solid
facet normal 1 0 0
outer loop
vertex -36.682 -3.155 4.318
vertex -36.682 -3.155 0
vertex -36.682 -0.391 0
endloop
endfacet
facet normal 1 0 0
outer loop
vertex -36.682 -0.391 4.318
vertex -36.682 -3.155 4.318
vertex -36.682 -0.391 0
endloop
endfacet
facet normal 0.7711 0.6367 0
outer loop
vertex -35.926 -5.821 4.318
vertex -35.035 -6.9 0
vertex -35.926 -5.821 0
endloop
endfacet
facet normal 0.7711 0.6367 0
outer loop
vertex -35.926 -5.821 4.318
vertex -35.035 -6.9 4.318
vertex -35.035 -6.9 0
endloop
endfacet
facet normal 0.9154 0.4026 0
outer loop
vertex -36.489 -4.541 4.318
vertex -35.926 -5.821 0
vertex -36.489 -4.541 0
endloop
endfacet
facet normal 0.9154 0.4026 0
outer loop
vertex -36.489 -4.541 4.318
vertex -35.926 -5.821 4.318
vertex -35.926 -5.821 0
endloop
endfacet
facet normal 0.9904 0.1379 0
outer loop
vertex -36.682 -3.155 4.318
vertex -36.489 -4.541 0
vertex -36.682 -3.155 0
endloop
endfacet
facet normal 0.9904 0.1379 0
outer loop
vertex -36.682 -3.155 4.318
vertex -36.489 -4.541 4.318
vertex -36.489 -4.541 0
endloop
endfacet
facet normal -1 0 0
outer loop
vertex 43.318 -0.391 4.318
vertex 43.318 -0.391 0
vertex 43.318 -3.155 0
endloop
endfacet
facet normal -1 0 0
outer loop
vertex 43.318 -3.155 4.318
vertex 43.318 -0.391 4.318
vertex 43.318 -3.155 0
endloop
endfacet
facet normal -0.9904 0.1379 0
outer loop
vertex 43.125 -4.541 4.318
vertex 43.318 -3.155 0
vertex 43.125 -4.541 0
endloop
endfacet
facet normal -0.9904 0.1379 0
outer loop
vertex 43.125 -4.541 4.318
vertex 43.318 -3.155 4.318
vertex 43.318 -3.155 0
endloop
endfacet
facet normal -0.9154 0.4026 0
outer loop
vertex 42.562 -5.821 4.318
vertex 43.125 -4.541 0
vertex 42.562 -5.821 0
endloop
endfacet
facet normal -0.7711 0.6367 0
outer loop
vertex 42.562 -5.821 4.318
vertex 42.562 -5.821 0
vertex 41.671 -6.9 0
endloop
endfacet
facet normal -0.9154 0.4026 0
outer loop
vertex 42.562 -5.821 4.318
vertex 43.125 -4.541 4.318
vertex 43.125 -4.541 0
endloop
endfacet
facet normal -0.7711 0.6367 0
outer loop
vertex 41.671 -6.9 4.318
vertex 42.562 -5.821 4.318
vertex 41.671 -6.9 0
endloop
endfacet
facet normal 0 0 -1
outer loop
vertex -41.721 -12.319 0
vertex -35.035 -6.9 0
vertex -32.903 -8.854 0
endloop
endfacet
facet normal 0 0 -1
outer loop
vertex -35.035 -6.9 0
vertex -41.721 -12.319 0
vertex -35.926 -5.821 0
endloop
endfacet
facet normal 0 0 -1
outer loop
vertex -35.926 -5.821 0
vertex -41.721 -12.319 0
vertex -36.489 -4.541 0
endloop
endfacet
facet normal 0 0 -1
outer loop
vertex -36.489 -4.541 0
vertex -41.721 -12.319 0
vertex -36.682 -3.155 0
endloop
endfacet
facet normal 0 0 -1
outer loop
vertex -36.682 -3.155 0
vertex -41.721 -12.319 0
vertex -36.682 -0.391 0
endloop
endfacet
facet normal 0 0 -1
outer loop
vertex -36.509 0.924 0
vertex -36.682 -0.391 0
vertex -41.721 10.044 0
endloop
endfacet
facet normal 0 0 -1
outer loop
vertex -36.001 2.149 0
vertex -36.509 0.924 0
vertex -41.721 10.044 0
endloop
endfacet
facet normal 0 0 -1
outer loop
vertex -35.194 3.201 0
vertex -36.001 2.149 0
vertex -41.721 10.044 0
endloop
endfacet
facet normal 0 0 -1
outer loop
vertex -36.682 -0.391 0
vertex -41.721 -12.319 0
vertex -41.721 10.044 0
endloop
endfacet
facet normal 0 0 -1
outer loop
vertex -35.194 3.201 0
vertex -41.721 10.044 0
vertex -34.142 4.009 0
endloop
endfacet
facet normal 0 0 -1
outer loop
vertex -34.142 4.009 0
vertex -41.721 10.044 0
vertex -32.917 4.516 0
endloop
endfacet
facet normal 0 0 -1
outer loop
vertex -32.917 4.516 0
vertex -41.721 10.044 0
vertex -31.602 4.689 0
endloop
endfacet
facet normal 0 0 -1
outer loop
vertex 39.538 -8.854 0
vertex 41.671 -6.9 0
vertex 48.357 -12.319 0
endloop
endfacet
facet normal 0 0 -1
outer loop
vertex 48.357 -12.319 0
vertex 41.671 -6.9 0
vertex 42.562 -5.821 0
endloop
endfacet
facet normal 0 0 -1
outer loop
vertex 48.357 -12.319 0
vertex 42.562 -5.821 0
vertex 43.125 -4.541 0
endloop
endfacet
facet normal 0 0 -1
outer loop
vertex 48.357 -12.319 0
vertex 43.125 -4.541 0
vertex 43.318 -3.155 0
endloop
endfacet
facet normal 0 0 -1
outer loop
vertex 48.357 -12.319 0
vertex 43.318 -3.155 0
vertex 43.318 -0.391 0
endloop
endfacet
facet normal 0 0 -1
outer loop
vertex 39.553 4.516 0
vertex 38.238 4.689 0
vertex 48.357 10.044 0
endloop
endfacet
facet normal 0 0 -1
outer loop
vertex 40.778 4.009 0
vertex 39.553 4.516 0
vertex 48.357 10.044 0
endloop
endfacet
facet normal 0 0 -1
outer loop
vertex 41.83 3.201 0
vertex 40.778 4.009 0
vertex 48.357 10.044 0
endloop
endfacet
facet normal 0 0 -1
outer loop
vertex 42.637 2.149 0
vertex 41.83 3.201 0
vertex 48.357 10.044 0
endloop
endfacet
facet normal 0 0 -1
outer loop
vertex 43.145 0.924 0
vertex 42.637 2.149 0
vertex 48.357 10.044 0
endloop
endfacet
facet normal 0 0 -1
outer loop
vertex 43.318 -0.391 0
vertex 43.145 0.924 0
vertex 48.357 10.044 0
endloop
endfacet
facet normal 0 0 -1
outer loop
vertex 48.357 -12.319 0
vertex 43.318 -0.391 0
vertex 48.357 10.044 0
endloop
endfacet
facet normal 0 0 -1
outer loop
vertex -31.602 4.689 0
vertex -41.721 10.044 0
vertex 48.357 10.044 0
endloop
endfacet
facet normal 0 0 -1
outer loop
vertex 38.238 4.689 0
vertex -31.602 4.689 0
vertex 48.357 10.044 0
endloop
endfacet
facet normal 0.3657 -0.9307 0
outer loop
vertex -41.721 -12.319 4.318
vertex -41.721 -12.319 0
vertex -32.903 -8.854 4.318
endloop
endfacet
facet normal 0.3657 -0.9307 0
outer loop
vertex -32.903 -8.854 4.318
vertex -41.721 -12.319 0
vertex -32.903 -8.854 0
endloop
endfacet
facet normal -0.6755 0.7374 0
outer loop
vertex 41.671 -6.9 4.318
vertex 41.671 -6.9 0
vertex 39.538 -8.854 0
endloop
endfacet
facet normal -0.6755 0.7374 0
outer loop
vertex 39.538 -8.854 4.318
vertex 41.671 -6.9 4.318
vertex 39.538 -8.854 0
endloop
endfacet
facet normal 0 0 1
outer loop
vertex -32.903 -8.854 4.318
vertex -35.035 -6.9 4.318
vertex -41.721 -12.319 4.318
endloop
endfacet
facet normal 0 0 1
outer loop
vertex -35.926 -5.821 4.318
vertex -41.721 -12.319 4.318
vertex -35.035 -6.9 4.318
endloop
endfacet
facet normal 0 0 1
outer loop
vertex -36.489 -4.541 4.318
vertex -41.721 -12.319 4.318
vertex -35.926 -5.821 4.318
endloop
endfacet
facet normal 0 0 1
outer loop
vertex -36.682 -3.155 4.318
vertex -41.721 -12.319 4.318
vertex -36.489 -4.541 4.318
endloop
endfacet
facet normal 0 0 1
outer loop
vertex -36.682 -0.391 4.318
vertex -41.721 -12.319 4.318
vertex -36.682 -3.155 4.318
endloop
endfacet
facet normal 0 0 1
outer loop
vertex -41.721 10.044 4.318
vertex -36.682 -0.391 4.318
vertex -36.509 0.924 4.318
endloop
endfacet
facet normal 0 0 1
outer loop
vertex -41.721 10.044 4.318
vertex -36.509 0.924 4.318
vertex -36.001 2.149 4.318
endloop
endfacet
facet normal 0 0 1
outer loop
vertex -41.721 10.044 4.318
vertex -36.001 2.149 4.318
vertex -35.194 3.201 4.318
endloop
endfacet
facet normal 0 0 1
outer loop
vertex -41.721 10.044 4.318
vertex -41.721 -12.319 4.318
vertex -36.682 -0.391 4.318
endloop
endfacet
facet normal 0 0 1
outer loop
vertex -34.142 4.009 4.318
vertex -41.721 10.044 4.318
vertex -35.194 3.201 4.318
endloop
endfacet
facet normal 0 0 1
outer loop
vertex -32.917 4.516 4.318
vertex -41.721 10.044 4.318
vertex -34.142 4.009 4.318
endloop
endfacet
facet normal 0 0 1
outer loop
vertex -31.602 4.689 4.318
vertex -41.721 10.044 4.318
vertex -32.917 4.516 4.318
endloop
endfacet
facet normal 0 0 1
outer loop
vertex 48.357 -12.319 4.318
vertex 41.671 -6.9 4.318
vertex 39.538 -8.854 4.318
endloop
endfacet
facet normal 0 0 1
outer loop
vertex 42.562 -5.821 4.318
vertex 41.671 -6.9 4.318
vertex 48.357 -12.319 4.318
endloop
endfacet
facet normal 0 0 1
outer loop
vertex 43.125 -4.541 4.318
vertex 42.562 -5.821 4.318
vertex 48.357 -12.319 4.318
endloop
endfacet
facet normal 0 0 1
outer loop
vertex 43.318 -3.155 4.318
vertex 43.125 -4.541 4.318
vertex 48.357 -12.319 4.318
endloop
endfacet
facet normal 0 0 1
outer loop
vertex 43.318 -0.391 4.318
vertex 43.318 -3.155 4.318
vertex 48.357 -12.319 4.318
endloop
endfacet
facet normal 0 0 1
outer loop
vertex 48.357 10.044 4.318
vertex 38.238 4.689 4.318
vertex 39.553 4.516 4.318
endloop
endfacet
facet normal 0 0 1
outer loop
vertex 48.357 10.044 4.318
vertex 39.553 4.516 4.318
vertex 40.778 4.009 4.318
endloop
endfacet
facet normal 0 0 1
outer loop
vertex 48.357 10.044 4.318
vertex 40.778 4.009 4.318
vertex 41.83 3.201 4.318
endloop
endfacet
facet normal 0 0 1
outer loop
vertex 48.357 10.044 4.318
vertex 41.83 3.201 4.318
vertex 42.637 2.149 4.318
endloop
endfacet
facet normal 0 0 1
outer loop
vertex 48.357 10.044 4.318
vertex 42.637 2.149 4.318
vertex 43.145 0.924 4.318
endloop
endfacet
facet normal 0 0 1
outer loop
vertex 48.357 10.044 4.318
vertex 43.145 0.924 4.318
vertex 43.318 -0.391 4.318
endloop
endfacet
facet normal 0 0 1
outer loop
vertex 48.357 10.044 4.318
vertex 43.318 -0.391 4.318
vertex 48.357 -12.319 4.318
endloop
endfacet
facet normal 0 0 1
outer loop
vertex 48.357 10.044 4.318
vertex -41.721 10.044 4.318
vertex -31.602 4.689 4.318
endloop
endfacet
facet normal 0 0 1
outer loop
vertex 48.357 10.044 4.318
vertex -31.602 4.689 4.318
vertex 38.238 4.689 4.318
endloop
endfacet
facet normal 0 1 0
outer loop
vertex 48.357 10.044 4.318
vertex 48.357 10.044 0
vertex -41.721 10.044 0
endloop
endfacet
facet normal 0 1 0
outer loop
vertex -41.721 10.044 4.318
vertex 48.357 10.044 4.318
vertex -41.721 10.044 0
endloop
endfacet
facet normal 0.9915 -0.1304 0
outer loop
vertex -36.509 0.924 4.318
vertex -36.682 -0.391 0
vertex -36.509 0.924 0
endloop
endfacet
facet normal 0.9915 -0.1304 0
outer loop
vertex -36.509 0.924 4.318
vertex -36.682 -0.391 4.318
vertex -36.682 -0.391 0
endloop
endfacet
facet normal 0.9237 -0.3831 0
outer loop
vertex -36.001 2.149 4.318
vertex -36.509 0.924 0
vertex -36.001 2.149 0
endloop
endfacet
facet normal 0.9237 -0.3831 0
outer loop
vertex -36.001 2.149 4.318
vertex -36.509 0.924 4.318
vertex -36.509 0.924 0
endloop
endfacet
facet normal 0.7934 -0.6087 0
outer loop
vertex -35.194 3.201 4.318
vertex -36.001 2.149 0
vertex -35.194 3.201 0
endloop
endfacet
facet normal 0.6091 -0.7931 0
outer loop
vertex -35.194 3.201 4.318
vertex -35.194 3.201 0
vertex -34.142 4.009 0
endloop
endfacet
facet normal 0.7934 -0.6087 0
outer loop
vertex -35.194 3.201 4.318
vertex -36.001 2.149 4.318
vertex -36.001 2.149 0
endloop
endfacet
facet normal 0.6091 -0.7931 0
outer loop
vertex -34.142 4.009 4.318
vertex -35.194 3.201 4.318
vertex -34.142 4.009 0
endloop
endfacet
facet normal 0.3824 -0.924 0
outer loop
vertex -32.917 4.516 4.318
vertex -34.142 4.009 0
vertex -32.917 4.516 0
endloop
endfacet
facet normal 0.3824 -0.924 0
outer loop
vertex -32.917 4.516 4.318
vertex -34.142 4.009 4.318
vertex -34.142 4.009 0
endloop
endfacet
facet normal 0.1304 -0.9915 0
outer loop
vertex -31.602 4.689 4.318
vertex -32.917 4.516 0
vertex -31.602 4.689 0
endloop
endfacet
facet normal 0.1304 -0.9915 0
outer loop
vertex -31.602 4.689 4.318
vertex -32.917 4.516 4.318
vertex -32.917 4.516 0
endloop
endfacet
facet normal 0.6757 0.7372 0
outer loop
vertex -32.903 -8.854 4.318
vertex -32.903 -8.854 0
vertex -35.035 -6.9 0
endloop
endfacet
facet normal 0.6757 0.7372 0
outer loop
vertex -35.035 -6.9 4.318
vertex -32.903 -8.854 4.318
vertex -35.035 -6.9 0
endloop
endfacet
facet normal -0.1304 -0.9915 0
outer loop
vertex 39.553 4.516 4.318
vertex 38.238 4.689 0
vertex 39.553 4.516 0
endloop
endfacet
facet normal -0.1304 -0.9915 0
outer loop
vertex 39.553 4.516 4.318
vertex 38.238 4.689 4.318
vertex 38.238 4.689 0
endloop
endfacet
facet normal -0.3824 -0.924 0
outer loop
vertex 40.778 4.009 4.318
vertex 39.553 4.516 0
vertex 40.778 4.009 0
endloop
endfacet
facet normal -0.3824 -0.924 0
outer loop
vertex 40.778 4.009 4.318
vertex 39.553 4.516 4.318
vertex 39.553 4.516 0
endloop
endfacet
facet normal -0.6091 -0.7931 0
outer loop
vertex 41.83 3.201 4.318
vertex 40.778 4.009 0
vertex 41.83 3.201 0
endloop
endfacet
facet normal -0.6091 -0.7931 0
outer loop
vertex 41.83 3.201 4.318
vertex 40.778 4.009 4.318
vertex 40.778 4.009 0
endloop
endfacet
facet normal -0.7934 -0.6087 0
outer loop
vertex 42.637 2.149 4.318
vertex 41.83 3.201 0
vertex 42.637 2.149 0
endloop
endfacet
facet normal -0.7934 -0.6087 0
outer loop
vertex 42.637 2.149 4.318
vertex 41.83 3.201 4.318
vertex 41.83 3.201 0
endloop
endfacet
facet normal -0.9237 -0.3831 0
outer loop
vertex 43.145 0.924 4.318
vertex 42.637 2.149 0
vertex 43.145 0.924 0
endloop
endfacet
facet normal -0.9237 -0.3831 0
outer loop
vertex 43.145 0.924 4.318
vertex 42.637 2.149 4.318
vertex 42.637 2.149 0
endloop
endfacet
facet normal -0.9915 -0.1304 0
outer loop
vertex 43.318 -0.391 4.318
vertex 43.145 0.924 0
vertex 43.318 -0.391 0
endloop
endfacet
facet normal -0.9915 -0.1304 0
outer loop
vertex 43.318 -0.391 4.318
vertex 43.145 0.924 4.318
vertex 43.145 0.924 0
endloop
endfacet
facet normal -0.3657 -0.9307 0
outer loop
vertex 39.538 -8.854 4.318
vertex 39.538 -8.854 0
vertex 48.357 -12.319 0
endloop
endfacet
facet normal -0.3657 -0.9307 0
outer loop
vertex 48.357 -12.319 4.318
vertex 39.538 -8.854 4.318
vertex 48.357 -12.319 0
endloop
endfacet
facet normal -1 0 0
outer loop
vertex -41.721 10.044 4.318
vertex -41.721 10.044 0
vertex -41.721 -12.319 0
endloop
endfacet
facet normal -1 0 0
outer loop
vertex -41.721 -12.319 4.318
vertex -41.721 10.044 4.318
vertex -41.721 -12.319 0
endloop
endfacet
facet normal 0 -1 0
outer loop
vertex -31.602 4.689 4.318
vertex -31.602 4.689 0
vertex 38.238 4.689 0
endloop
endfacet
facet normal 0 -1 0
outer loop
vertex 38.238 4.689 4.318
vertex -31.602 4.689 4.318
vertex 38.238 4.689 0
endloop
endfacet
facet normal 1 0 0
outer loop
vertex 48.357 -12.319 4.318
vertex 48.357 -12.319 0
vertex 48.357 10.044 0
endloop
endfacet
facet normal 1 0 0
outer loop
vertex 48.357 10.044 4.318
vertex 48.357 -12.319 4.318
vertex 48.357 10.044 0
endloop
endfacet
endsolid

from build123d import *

# Parameters (mm, degrees)
F1_DEPTH = 4.318
F2_R     = 5.08


with BuildPart() as f1:
    # F0 (on Top) → F1 (new body)
    with BuildSketch(Plane.XY):
        Polygon((-32.902525, -8.854119), (-36.682051, -5.389552), (-36.682051, 4.689189), (43.317949, 4.689189), (43.317949, -5.389552), (39.538425, -8.854119), (48.357325, -12.318687), (48.357325, 10.043521), (-41.721424, 10.043521), (-41.721424, -12.318687), align=None)
    extrude(amount=F1_DEPTH)

    # F2
    f2_edges = [f1.edges().sort_by_distance(p)[0] for p in [
        (-36.682051, 4.689189, 2.159),
        (43.317949, 4.689189, 2.159),
        (-36.682051, -5.389552, 2.159),
        (43.317949, -5.389552, 2.159),
    ]]
    fillet(f2_edges, radius=F2_R)


solid = f1.part
